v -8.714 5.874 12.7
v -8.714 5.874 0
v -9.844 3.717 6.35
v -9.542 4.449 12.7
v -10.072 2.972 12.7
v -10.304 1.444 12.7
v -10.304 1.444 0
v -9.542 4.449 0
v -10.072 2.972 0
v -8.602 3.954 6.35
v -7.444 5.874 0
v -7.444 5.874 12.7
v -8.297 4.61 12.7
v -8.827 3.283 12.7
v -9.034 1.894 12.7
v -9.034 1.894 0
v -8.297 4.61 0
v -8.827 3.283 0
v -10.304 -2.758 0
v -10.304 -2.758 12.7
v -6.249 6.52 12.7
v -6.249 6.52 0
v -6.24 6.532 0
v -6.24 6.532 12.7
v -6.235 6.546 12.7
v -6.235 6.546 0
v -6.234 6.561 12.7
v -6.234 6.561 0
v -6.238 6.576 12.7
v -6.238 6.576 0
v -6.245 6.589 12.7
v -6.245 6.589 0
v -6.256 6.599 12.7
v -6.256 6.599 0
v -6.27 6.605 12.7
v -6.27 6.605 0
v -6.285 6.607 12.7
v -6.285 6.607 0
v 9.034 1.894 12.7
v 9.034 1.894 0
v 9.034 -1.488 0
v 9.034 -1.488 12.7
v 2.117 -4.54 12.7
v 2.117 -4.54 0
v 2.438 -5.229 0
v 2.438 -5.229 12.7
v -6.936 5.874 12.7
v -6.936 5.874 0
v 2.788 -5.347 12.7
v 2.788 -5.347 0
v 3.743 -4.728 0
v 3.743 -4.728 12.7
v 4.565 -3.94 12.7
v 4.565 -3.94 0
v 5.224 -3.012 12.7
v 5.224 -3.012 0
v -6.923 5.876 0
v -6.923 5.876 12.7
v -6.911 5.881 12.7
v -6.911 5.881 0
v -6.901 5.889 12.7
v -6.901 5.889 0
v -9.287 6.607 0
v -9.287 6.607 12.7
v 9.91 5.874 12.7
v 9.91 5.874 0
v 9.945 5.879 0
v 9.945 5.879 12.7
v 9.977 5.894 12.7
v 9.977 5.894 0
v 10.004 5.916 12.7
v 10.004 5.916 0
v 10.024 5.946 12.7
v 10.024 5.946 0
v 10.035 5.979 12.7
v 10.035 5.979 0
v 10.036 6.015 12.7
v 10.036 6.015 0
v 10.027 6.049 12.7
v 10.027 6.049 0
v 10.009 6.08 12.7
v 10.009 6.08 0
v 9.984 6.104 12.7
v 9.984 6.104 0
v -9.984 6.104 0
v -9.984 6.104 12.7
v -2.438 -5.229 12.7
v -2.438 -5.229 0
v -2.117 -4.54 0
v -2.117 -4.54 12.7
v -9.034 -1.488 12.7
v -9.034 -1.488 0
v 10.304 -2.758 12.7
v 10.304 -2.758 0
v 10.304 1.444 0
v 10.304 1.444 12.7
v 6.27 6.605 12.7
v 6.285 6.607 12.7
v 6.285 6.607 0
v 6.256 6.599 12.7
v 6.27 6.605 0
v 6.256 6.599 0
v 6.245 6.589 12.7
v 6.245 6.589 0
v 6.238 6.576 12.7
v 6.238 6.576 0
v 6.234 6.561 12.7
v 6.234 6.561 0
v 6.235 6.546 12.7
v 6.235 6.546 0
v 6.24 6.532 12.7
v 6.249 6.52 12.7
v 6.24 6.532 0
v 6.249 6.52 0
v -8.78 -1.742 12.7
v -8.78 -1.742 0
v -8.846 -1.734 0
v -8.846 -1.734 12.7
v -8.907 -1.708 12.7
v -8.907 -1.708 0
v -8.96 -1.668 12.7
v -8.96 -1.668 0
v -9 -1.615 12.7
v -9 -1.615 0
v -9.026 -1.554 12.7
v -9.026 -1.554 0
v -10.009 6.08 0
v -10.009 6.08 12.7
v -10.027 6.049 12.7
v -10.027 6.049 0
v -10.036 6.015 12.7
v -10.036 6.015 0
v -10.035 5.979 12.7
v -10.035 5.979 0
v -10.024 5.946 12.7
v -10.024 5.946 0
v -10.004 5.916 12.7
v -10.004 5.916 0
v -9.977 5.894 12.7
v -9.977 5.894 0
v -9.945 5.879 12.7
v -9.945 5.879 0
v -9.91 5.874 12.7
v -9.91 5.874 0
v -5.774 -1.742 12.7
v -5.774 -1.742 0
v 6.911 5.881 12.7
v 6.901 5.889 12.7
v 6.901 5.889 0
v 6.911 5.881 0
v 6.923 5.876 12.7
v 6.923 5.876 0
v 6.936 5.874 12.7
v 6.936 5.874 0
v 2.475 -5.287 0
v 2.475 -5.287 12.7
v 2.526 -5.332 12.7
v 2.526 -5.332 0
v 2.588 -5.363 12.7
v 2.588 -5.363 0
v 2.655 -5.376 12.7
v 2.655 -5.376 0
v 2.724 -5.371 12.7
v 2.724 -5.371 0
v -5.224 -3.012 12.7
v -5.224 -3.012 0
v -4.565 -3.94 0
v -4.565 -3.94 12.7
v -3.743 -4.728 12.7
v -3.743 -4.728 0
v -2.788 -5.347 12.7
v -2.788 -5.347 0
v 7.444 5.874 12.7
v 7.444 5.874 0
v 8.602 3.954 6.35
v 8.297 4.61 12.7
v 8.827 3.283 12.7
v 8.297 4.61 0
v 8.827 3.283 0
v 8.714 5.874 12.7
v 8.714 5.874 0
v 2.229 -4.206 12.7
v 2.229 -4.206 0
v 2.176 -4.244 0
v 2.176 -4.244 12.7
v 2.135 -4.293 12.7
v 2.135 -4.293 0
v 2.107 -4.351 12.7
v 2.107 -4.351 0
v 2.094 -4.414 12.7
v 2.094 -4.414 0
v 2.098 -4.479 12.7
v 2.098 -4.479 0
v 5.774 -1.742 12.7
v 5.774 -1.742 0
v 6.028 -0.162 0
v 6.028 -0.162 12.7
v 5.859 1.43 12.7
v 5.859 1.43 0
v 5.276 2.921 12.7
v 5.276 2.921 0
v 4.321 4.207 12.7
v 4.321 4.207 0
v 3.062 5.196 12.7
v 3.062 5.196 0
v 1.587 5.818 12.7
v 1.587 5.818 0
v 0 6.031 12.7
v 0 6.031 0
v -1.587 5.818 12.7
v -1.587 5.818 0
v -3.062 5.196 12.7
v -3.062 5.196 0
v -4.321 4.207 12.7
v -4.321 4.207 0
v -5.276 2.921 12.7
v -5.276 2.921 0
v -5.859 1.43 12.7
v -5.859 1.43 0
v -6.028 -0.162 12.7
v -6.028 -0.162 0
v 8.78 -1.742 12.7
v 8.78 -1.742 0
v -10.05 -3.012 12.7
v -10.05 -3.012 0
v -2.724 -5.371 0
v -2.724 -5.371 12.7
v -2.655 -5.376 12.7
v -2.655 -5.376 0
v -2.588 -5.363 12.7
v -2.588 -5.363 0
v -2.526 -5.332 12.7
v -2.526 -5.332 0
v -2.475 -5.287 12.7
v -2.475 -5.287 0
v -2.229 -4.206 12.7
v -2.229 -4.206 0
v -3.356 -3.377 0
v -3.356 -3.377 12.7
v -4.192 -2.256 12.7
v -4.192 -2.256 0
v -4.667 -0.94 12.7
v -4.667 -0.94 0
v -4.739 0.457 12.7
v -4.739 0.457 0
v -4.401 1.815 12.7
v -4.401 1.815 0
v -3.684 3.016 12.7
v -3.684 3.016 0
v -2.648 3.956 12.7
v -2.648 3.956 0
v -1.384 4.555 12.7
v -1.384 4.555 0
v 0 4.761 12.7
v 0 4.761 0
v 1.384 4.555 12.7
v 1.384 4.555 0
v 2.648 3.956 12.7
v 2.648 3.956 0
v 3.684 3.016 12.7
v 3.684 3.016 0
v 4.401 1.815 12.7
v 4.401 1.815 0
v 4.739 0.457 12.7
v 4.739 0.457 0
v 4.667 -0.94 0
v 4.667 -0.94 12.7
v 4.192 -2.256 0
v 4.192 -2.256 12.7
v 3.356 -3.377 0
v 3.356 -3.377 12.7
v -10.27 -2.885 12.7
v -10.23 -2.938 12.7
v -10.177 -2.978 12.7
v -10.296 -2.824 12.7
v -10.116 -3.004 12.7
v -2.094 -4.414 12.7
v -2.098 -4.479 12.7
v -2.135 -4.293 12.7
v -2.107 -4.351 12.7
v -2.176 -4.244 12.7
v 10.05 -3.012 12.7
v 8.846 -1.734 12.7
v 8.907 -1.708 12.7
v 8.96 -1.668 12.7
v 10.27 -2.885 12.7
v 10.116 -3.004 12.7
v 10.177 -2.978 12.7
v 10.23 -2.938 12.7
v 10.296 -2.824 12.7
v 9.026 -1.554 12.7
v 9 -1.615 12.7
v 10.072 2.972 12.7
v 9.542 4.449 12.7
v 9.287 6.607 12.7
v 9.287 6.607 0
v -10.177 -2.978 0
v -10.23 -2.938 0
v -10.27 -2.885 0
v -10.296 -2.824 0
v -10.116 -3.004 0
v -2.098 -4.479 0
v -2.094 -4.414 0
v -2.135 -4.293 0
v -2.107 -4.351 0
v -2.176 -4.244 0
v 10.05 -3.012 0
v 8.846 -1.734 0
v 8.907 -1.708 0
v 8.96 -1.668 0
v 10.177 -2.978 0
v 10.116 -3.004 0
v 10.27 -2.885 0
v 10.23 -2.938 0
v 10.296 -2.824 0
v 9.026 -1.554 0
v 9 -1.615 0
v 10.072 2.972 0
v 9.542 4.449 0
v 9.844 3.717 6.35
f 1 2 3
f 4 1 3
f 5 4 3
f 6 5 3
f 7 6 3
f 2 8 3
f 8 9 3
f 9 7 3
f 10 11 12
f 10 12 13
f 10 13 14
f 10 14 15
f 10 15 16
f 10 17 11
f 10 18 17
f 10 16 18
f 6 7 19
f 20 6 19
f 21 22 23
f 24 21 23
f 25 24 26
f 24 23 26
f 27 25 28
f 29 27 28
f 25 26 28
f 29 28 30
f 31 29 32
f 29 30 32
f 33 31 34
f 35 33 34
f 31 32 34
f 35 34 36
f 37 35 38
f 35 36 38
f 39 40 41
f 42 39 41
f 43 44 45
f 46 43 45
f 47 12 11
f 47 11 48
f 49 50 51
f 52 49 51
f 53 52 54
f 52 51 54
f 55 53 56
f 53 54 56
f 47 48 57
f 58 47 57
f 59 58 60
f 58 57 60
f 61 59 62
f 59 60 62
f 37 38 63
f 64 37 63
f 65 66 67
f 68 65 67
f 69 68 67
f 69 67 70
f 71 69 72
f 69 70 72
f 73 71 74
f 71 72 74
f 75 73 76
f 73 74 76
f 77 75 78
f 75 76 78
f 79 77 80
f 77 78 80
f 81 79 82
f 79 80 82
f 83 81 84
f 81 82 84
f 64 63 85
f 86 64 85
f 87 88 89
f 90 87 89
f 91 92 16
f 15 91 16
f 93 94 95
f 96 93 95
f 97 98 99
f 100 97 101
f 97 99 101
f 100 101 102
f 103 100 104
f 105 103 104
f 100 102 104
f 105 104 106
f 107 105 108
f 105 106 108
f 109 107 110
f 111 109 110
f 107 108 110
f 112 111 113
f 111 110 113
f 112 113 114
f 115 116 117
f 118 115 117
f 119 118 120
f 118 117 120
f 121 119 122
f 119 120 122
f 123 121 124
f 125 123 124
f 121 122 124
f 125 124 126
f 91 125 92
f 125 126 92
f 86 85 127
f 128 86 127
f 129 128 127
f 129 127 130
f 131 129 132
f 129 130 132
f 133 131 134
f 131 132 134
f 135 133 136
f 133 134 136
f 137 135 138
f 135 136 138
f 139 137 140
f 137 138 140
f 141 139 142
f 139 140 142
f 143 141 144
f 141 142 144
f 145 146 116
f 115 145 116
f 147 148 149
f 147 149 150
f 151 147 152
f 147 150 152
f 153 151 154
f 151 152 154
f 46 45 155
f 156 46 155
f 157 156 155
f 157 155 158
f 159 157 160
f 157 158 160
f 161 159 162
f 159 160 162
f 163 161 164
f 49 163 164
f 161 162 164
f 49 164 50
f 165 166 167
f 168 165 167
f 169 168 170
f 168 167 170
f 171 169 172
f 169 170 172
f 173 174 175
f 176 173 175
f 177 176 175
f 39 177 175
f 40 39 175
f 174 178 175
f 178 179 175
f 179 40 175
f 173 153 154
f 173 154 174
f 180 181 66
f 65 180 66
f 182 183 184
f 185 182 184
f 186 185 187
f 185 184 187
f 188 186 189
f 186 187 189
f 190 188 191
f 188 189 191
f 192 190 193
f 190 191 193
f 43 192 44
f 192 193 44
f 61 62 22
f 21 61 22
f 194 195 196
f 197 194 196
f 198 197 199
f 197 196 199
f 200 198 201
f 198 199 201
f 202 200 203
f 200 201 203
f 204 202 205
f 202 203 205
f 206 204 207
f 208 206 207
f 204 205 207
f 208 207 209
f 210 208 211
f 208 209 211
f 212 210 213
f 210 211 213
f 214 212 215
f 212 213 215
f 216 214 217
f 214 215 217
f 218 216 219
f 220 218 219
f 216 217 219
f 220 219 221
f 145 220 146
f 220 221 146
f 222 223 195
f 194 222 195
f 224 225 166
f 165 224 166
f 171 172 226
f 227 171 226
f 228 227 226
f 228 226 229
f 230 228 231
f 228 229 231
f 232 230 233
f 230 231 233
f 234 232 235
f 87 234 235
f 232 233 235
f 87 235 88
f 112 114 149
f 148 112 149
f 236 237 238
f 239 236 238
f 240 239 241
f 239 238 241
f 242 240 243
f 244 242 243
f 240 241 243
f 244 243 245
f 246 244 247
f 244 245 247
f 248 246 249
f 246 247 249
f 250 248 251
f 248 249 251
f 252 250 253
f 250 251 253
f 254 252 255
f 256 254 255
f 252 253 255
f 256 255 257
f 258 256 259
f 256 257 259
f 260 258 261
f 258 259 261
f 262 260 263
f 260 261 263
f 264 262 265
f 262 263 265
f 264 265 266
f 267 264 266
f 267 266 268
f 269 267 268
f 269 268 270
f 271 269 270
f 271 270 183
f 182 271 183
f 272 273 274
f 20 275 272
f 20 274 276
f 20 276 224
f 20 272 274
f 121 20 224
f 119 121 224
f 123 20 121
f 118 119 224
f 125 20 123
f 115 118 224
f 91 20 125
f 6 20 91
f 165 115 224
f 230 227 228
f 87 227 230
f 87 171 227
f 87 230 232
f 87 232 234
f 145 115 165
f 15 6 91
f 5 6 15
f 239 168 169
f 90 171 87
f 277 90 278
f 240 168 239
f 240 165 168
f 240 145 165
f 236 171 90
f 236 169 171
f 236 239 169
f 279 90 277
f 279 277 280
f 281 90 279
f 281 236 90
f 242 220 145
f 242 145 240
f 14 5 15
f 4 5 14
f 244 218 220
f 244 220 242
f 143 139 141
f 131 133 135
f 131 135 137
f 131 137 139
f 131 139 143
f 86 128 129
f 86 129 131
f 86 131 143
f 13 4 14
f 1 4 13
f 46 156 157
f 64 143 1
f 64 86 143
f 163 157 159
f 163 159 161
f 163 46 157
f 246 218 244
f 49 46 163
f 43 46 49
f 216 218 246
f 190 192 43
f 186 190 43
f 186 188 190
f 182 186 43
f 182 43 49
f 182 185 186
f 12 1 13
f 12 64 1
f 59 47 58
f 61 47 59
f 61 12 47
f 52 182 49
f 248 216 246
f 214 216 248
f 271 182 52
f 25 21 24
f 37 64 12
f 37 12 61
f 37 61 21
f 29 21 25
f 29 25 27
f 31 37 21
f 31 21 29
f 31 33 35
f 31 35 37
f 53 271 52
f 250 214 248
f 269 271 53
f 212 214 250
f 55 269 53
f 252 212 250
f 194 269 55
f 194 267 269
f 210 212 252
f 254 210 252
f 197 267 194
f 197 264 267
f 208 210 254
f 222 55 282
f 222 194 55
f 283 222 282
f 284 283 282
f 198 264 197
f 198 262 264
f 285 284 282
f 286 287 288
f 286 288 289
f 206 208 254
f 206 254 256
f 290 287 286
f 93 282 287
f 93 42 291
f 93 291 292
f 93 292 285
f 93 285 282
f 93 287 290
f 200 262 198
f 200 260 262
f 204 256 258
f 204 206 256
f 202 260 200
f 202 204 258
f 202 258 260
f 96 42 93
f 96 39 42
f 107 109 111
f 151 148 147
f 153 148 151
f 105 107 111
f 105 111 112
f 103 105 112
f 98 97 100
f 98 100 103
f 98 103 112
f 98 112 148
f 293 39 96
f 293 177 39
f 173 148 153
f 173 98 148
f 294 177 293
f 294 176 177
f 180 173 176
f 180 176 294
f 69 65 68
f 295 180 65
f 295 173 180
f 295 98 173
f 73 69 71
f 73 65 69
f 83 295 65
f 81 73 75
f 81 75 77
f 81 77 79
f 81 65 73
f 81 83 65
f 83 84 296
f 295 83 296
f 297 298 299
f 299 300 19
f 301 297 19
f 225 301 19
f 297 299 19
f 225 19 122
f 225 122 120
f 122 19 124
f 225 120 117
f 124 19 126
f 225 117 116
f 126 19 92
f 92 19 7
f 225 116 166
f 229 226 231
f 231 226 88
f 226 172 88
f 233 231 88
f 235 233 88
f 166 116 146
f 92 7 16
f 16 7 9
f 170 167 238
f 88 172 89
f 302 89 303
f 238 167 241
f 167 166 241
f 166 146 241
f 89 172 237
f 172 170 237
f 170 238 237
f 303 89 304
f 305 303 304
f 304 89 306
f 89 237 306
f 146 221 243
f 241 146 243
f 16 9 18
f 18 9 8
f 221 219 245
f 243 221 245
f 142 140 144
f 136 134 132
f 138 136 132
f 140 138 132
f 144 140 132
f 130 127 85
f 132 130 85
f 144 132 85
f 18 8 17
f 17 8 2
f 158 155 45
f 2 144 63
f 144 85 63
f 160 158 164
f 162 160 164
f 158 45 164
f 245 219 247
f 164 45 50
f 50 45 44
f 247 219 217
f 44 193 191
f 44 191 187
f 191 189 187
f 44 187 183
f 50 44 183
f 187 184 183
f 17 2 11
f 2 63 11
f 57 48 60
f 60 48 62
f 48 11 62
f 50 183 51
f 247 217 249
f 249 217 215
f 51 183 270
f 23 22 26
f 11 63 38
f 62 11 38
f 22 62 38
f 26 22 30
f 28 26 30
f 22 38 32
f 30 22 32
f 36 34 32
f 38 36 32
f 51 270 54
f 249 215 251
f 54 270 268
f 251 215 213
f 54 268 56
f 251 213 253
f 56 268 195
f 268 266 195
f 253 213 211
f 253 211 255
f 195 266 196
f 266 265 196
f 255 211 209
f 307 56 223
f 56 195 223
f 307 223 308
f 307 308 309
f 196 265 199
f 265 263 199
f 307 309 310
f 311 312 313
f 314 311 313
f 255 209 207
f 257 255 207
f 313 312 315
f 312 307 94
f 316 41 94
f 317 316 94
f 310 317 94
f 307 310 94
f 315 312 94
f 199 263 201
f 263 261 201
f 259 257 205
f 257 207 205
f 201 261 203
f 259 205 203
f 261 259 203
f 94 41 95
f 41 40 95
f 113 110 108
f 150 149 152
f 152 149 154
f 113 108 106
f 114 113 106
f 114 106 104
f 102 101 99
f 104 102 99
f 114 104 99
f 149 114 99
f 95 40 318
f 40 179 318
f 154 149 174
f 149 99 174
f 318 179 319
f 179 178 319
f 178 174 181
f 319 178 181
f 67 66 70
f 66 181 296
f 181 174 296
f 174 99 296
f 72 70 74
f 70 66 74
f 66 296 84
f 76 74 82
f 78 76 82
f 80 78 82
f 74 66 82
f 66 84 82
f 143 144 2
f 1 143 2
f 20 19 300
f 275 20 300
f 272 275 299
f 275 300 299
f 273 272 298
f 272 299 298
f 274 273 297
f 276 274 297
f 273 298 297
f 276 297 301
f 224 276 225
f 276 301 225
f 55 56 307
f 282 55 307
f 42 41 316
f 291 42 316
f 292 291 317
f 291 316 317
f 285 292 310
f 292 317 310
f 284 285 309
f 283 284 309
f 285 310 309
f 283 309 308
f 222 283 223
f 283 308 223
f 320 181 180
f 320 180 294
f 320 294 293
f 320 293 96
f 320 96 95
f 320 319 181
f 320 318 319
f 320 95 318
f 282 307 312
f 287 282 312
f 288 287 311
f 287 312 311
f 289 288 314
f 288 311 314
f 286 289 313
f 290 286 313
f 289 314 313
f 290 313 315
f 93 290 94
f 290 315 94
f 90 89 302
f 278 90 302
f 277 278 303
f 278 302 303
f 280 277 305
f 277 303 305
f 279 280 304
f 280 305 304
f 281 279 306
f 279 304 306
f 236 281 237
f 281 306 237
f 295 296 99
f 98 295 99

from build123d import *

# Parameters (mm, degrees)
BOSS_EXTRUDE1_DEPTH = 12.7


with BuildPart() as part:
    # Sketch2 → Boss-Extrude1 (new body)
    with BuildSketch(Plane.XY):
        with BuildLine():
            ThreePointArc((5.773500374, -1.742289015), (0, 6.030661454), (-5.773500374, -1.742289015))
            Line((-5.773500374, -1.742289015), (-8.780460974, -1.742289015))
            ThreePointArc((-8.780460974, -1.742289015), (-8.960066096, -1.667894137), (-9.034460974, -1.488289015))
            Line((-9.034460974, -1.488289015), (-9.034460974, 1.893843998))
            add(Edge.make_bspline(
                [(-7.444124292, 5.87424347), (-8.965547881, 4.023759), (-9.034460974, 1.893843998)],
                knots=[0, 0, 0, 0.913335216, 0.913335216, 0.913335216], degree=2))
            Line((-7.444124292, 5.87424347), (-6.936124292, 5.87424347))
            ThreePointArc((-6.936124292, 5.87424347), (-6.917046287, 5.877961948), (-6.90076124, 5.888573008))
            Line((-6.90076124, 5.888573008), (-6.249346457, 6.52020785))
            ThreePointArc((-6.249346457, 6.52020785), (-6.237627986, 6.575756317), (-6.284709509, 6.607478312))
            Line((-6.284709509, 6.607478312), (-9.286536111, 6.607478312))
            Line((-9.286536111, 6.607478312), (-9.983863182, 6.104225847))
            ThreePointArc((-9.983863182, 6.104225847), (-10.030388572, 5.962190697), (-9.909542054, 5.87424347))
            Line((-9.909542054, 5.87424347), (-8.714124292, 5.87424347))
            add(Edge.make_bspline(
                [(-8.714124292, 5.87424347), (-10.178770924, 3.775549962), (-10.304460974, 1.443821028)],
                knots=[0, 0, 0, 0.841932778, 0.841932778, 0.841932778], degree=2))
            Line((-10.304460974, 1.443821028), (-10.304460974, -2.758289015))
            ThreePointArc((-10.304460974, -2.758289015), (-10.230066096, -2.937894137), (-10.050460974, -3.012289015))
            Line((-10.050460974, -3.012289015), (-5.224460974, -3.012289015))
            ThreePointArc((-5.224460974, -3.012289015), (-4.172972974, -4.353754028), (-2.788146807, -5.347440038))
            ThreePointArc((-2.788146807, -5.347440038), (-2.587836882, -5.362863945), (-2.438222108, -5.228784184))
            Line((-2.438222108, -5.228784184), (-2.117239548, -4.540434863))
            ThreePointArc((-2.117239548, -4.540434863), (-2.106552792, -4.351089815), (-2.22923648, -4.206471467))
            ThreePointArc((-2.22923648, -4.206471467), (0, 4.760661454), (2.22923648, -4.206471467))
            ThreePointArc((2.22923648, -4.206471467), (2.106552792, -4.351089815), (2.117239548, -4.540434863))
            Line((2.117239548, -4.540434863), (2.438222108, -5.228784184))
            ThreePointArc((2.438222108, -5.228784184), (2.587836882, -5.362863945), (2.788146807, -5.347440038))
            ThreePointArc((2.788146807, -5.347440038), (4.172972974, -4.353754028), (5.224460974, -3.012289015))
            Line((5.224460974, -3.012289015), (10.050460974, -3.012289015))
            ThreePointArc((10.050460974, -3.012289015), (10.230066096, -2.937894137), (10.304460974, -2.758289015))
            Line((10.304460974, -2.758289015), (10.304460974, 1.443821028))
            add(Edge.make_bspline(
                [(8.714124292, 5.87424347), (10.178770924, 3.775549962), (10.304460974, 1.443821028)],
                knots=[0, 0, 0, 0.841932778, 0.841932778, 0.841932778], degree=2))
            Line((8.714124292, 5.87424347), (9.909542054, 5.87424347))
            ThreePointArc((9.909542054, 5.87424347), (10.030388572, 5.962190697), (9.983863182, 6.104225847))
            Line((9.983863182, 6.104225847), (9.286536111, 6.607478312))
            Line((9.286536111, 6.607478312), (6.284709509, 6.607478312))
            ThreePointArc((6.284709509, 6.607478312), (6.237627986, 6.575756317), (6.249346457, 6.52020785))
            Line((6.249346457, 6.52020785), (6.90076124, 5.888573008))
            ThreePointArc((6.90076124, 5.888573008), (6.917046287, 5.877961948), (6.936124292, 5.87424347))
            Line((6.936124292, 5.87424347), (7.444124292, 5.87424347))
            add(Edge.make_bspline(
                [(7.444124292, 5.87424347), (8.965547881, 4.023759), (9.034460974, 1.893843998)],
                knots=[0, 0, 0, 0.913335216, 0.913335216, 0.913335216], degree=2))
            Line((9.034460974, 1.893843998), (9.034460974, -1.488289015))
            ThreePointArc((9.034460974, -1.488289015), (8.960066096, -1.667894137), (8.780460974, -1.742289015))
            Line((8.780460974, -1.742289015), (5.773500374, -1.742289015))
        make_face()
    extrude(amount=BOSS_EXTRUDE1_DEPTH)


solid = part.part
